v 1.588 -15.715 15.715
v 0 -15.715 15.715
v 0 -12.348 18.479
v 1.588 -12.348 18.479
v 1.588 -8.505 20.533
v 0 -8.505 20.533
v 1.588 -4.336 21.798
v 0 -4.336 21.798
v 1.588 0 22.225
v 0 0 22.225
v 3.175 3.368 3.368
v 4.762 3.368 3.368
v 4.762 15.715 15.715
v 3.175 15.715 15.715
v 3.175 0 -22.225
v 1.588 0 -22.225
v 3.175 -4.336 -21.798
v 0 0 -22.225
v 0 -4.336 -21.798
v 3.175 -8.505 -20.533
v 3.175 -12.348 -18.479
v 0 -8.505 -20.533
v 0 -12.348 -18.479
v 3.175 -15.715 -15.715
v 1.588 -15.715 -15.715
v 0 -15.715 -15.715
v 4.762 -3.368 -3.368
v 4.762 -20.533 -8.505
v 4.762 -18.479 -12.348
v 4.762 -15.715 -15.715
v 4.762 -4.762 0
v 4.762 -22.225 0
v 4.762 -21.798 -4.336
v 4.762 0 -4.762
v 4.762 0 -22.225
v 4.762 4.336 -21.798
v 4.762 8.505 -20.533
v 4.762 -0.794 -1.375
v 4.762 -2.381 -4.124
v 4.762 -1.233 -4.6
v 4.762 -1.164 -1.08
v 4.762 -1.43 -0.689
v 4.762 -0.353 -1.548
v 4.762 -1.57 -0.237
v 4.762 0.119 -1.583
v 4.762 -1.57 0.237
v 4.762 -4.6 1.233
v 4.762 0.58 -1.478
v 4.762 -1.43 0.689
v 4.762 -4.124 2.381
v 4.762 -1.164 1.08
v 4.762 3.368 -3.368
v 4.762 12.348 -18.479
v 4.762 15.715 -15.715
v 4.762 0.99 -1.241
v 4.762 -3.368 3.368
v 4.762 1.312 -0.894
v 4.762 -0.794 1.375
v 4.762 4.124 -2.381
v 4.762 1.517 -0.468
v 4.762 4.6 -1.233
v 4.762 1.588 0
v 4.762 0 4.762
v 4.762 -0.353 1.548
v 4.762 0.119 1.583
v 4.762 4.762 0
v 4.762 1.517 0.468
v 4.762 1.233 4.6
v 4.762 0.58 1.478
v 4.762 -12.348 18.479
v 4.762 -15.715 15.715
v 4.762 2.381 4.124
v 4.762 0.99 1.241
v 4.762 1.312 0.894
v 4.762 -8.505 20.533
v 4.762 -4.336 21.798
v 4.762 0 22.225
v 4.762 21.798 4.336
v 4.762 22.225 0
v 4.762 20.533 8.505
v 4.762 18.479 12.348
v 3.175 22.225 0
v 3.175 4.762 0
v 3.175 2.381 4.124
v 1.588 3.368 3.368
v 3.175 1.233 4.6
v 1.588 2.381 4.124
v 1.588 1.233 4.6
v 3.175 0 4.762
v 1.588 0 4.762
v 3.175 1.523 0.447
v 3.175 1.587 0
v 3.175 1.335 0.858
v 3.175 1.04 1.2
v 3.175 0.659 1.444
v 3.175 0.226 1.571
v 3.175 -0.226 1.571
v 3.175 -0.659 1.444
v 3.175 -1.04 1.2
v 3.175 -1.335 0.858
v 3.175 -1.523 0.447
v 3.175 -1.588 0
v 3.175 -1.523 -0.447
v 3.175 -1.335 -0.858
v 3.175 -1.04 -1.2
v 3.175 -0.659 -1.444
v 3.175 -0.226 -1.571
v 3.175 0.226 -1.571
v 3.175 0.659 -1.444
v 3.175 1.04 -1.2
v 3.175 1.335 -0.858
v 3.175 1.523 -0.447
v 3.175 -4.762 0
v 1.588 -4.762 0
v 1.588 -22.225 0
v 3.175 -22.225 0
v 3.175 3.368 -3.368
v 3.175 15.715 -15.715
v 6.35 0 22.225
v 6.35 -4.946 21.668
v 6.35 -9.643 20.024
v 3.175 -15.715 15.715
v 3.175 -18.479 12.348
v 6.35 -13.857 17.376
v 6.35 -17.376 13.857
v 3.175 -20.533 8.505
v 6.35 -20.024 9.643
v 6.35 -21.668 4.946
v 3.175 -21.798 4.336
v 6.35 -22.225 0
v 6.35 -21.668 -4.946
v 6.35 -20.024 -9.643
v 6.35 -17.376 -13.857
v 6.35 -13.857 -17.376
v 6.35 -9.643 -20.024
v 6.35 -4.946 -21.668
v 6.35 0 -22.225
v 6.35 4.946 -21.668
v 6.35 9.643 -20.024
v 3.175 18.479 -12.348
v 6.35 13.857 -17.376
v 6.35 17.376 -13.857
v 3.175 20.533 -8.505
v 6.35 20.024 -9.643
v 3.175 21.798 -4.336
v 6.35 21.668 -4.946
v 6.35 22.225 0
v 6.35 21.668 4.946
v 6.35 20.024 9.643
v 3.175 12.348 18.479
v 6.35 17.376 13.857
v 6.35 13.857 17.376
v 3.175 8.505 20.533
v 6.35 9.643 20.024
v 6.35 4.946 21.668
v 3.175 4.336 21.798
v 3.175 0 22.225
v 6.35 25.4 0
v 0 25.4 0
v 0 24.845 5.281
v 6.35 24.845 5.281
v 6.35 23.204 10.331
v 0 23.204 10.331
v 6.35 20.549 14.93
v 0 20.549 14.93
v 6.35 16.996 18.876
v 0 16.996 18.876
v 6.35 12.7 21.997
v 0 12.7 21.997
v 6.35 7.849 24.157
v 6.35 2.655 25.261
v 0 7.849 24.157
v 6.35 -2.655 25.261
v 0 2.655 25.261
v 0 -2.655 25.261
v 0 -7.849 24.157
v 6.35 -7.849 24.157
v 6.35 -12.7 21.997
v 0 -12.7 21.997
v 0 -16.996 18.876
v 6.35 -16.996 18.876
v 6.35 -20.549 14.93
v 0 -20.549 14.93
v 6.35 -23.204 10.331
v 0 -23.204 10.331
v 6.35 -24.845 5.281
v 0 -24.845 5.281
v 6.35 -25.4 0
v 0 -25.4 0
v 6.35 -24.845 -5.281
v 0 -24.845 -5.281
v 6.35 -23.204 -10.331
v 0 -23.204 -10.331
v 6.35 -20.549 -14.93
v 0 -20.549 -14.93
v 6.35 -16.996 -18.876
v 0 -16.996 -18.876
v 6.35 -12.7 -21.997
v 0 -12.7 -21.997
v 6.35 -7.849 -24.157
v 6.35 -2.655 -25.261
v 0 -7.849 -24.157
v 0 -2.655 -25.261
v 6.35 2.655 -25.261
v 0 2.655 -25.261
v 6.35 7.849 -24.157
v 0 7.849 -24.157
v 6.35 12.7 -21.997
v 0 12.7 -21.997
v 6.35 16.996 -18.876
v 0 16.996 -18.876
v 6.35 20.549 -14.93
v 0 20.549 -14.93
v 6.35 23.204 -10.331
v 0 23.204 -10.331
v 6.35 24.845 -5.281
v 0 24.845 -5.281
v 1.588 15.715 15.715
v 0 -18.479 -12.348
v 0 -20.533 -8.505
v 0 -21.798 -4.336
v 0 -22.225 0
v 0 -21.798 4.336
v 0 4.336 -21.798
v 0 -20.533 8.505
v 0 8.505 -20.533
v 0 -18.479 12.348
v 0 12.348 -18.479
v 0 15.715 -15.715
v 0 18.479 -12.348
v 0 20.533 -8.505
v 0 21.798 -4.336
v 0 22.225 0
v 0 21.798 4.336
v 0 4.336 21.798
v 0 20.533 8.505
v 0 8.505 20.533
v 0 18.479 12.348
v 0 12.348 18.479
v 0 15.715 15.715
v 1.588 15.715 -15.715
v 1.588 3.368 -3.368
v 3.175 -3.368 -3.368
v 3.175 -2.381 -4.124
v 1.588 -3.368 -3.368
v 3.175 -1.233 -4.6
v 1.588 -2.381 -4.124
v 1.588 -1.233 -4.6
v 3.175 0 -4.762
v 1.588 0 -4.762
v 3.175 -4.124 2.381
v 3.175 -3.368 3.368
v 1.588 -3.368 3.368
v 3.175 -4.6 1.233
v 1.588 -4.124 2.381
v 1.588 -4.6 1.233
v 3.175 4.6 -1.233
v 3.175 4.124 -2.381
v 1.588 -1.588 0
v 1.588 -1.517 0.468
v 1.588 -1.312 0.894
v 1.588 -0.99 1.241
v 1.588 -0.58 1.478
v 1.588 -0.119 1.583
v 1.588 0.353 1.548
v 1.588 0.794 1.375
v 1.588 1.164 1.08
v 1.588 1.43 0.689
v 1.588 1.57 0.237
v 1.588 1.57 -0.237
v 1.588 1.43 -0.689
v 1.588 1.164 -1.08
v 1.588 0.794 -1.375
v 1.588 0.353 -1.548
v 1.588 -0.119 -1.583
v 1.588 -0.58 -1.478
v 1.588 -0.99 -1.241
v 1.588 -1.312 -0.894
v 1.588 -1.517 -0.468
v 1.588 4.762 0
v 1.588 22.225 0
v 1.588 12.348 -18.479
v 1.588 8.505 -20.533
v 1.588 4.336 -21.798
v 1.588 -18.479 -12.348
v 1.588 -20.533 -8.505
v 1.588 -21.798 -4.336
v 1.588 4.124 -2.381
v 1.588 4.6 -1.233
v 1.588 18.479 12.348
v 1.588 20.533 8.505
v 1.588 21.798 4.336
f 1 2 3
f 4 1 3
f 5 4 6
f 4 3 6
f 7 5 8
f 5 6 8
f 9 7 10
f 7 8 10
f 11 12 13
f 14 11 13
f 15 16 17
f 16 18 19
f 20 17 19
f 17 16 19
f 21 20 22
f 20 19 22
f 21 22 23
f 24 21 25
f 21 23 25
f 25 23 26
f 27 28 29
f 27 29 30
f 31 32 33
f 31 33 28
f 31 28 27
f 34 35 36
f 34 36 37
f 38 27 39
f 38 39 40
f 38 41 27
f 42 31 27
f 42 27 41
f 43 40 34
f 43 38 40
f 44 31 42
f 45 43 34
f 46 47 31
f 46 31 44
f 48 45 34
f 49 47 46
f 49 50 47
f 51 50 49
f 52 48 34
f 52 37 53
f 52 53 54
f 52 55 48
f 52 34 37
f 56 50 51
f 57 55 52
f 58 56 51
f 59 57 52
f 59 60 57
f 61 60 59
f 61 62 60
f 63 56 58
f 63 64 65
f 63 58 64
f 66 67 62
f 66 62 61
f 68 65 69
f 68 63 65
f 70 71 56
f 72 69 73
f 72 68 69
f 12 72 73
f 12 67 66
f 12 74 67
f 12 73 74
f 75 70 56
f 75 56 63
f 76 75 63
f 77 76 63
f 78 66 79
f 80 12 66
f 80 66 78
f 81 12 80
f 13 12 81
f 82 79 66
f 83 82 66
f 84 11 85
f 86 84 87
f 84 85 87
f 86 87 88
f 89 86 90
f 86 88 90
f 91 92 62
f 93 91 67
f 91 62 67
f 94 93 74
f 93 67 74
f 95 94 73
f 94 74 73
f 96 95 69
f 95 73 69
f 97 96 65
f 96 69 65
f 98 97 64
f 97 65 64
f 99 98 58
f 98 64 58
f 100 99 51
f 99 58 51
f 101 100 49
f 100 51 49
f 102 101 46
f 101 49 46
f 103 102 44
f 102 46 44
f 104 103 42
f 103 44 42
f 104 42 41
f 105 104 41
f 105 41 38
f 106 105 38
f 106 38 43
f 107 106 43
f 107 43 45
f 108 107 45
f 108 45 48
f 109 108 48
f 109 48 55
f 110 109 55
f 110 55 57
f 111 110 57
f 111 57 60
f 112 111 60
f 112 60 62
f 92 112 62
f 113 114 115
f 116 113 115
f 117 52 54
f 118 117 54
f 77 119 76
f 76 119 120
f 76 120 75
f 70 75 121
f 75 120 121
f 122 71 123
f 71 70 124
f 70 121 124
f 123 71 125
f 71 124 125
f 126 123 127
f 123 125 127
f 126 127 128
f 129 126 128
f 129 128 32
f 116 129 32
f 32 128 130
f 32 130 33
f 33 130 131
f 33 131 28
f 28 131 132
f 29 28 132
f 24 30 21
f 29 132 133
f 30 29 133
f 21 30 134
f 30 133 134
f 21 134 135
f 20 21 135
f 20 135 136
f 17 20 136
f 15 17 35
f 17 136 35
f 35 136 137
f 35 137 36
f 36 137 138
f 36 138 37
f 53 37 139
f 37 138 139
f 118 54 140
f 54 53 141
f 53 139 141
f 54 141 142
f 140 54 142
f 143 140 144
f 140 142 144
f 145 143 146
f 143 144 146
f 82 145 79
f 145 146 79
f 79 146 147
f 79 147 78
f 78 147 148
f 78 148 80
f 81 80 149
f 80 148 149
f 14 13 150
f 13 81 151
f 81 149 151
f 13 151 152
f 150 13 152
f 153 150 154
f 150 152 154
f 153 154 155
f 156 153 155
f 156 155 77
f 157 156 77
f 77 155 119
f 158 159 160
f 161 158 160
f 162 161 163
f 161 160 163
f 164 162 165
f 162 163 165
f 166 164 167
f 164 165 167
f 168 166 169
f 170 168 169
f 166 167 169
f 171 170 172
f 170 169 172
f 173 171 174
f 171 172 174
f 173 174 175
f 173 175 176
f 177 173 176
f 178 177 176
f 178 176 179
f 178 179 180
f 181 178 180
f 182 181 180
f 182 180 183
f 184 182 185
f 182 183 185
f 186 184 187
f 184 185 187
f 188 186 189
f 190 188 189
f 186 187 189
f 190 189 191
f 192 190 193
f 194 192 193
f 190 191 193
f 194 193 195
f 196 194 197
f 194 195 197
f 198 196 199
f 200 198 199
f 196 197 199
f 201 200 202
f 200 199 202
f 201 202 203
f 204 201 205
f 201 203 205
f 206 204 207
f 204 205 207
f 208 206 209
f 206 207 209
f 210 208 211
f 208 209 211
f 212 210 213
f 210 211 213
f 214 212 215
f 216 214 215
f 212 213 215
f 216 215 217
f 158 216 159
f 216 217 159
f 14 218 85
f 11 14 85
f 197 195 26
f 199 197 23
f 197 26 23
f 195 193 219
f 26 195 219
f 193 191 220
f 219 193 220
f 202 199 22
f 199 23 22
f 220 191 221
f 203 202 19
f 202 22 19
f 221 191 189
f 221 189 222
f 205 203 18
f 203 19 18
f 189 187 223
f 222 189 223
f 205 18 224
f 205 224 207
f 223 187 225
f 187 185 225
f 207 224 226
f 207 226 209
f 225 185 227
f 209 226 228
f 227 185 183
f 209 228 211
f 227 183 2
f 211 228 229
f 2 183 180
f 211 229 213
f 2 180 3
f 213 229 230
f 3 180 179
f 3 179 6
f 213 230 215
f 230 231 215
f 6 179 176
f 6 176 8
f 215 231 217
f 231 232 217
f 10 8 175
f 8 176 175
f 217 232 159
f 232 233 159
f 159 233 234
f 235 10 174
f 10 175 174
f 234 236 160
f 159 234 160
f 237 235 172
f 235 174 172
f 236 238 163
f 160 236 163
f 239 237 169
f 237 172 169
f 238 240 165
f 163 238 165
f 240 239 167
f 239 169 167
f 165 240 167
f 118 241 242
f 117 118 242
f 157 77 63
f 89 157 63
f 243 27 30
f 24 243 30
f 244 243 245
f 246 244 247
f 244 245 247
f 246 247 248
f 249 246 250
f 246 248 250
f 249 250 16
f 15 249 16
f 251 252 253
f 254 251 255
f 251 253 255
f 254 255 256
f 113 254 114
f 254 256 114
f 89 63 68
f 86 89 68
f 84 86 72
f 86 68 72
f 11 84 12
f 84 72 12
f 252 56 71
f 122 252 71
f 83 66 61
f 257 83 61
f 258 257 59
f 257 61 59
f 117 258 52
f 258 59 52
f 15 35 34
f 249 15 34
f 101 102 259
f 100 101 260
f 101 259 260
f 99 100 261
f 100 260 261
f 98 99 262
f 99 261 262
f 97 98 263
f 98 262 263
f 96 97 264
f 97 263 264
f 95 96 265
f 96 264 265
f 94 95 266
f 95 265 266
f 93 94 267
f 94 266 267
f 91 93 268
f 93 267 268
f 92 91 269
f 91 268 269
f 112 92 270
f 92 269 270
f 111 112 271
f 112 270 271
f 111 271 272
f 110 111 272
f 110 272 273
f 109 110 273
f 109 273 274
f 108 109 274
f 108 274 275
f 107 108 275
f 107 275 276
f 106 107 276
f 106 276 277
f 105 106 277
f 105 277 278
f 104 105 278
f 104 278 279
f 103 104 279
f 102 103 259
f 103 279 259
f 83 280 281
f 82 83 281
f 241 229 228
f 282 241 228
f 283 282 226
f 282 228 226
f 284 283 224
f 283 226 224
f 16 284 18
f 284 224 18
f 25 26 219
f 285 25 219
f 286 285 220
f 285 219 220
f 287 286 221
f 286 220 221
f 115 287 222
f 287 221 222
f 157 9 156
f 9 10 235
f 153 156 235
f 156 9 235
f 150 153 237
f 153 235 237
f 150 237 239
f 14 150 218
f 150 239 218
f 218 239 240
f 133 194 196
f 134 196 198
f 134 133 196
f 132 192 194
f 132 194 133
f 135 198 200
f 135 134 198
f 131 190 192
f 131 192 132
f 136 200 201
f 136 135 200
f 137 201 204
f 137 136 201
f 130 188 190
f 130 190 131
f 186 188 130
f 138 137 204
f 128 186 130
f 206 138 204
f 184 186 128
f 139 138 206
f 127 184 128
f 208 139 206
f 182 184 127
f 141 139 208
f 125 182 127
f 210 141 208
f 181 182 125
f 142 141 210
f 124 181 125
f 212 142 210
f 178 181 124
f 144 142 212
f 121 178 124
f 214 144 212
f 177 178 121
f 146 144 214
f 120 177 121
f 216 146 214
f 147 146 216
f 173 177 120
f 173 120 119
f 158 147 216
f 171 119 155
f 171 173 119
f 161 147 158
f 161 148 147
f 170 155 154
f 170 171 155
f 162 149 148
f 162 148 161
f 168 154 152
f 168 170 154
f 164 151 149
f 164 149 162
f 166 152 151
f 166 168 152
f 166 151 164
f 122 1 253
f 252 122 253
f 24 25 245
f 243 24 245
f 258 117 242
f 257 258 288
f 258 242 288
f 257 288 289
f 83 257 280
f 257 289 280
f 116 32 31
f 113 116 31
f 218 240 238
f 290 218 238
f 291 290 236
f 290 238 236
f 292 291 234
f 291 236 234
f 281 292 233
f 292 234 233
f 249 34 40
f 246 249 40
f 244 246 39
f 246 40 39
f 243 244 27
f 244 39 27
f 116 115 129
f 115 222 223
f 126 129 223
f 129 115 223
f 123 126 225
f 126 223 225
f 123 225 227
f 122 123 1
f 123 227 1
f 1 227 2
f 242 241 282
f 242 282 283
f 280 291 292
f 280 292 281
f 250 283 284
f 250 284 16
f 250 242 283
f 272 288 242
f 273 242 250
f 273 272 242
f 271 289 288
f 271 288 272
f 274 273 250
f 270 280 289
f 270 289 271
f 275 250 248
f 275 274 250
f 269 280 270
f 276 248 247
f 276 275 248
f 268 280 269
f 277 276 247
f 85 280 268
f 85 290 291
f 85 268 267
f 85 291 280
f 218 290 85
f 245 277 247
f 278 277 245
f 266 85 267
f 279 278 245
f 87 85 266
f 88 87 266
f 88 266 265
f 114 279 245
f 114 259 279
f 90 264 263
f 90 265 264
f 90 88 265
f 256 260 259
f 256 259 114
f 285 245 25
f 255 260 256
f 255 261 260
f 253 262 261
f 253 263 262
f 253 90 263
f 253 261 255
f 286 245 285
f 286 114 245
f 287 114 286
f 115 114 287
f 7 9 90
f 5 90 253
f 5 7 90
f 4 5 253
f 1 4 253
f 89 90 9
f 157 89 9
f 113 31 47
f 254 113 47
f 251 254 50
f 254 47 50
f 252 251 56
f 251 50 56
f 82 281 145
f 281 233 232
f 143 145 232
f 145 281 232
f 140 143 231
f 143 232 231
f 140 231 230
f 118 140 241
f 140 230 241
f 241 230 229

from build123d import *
from build123d import SkipClean  # not in build123d's __all__

# Parameters (mm, degrees)
F0_R       = 25.4
F1_DEPTH   = 6.35
F2_R       = 1.5875
F3_DEPTH   = 3.175
F4_DEPTH   = 1.5875
F5_R       = 1.5875
F3_FACE4_R = 1.5875
F4_FACE_R  = 1.5875
F6_DEPTH   = 1.5875
F7_DEPTH   = 3.175


with BuildPart() as f1:
    # F0 (on Right) → F1 (new body)
    with BuildSketch(Plane.YZ):
        Circle(F0_R)
    extrude(amount=F1_DEPTH)

    # F2 (on face) → F3 (cut)
    with BuildSketch(Plane.YZ.offset(6.35)):
        with BuildLine():
            Line((-3.3675960454, 3.3675960454), (-15.7154482119, 15.7154482119))
            ThreePointArc((-15.7154482119, 15.7154482119), (-20.5332226101, 8.5051392843), (-22.225, 0))
            Line((-22.225, 0), (-4.7625, 0))
            ThreePointArc((-4.7625, 0), (-4.3999762736, 1.8225298466), (-3.3675960454, 3.3675960454))
        make_face()
        with BuildLine():
            ThreePointArc((-15.7154482119, -15.7154482119), (-8.5051392843, -20.5332226101), (0, -22.225))
            Line((0, -22.225), (0, -4.7625))
            ThreePointArc((0, -4.7625), (-1.8225298466, -4.3999762736), (-3.3675960454, -3.3675960454))
            Line((-3.3675960454, -3.3675960454), (-15.7154482119, -15.7154482119))
        make_face()
        with BuildLine():
            ThreePointArc((15.7154482119, -15.7154482119), (20.5332226101, -8.5051392843), (22.225, 0))
            Line((22.225, 0), (4.7625, 0))
            ThreePointArc((4.7625, 0), (4.3999762736, -1.8225298466), (3.3675960454, -3.3675960454))
            Line((3.3675960454, -3.3675960454), (15.7154482119, -15.7154482119))
        make_face()
        with BuildLine():
            Line((3.3675960454, 3.3675960454), (15.7154482119, 15.7154482119))
            ThreePointArc((15.7154482119, 15.7154482119), (8.5051392843, 20.5332226101), (0, 22.225))
            Line((0, 22.225), (0, 4.7625))
            ThreePointArc((0, 4.7625), (1.8225298466, 4.3999762736), (3.3675960454, 3.3675960454))
        make_face()
        Circle(F2_R)
    extrude(amount=-F3_DEPTH, mode=Mode.SUBTRACT)

    # F2 (on face) → F4 (cut)
    with BuildSketch(Plane.YZ.offset(6.35)):
        with BuildLine():
            Line((0, 4.7625), (0, 22.225))
            ThreePointArc((0, 22.225), (-8.5051392843, 20.5332226101), (-15.7154482119, 15.7154482119))
            Line((-15.7154482119, 15.7154482119), (-3.3675960454, 3.3675960454))
            ThreePointArc((-3.3675960454, 3.3675960454), (-1.8225298466, 4.3999762736), (0, 4.7625))
        make_face()
        with BuildLine():
            Line((4.7625, 0), (22.225, 0))
            ThreePointArc((22.225, 0), (20.5332226101, 8.5051392843), (15.7154482119, 15.7154482119))
            Line((15.7154482119, 15.7154482119), (3.3675960454, 3.3675960454))
            ThreePointArc((3.3675960454, 3.3675960454), (4.3999762736, 1.8225298466), (4.7625, 0))
        make_face()
        with BuildLine():
            ThreePointArc((0, -22.225), (8.5051392843, -20.5332226101), (15.7154482119, -15.7154482119))
            Line((15.7154482119, -15.7154482119), (3.3675960454, -3.3675960454))
            ThreePointArc((3.3675960454, -3.3675960454), (1.8225298466, -4.3999762736), (0, -4.7625))
            Line((0, -4.7625), (0, -22.225))
        make_face()
        with BuildLine():
            ThreePointArc((-22.225, 0), (-20.5332226101, -8.5051392843), (-15.7154482119, -15.7154482119))
            Line((-15.7154482119, -15.7154482119), (-3.3675960454, -3.3675960454))
            ThreePointArc((-3.3675960454, -3.3675960454), (-4.3999762736, -1.8225298466), (-4.7625, 0))
            Line((-4.7625, 0), (-22.225, 0))
        make_face()
        with BuildLine():
            ThreePointArc((3.3675960454, -3.3675960454), (4.3999762736, -1.8225298466), (4.7625, 0))
            ThreePointArc((4.7625, 0), (4.3999762736, 1.8225298466), (3.3675960454, 3.3675960454))
            ThreePointArc((3.3675960454, 3.3675960454), (1.8225298466, 4.3999762736), (0, 4.7625))
            ThreePointArc((0, 4.7625), (-1.8225298466, 4.3999762736), (-3.3675960454, 3.3675960454))
            ThreePointArc((-3.3675960454, 3.3675960454), (-4.3999762736, 1.8225298466), (-4.7625, 0))
            ThreePointArc((-4.7625, 0), (-4.3999762736, -1.8225298466), (-3.3675960454, -3.3675960454))
            ThreePointArc((-3.3675960454, -3.3675960454), (-1.8225298466, -4.3999762736), (0, -4.7625))
            ThreePointArc((0, -4.7625), (1.8225298466, -4.3999762736), (3.3675960454, -3.3675960454))
        make_face()
        Circle(F2_R, mode=Mode.SUBTRACT)
    extrude(amount=-F4_DEPTH, mode=Mode.SUBTRACT)

    # F5 (on face) + F3_face (on face) + F3_face1 (on face) + F3_face2 (on face) + F3_face3 (on face) + F3_face4 (on face) + F4_face (on face) → F6 (cut)
    with BuildSketch(Plane(origin=(0, 0, 0), x_dir=(0, -1, 0), z_dir=(-1, 0, 0))):
        with BuildLine():
            Line((3.3675960454, 3.3675960454), (15.7154482119, 15.7154482119))
            ThreePointArc((15.7154482119, 15.7154482119), (8.5051392843, 20.5332226101), (0, 22.225))
            Line((0, 22.225), (0, 4.7625))
            ThreePointArc((0, 4.7625), (1.8225298466, 4.3999762736), (3.3675960454, 3.3675960454))
        make_face()
        with BuildLine():
            ThreePointArc((15.7154482119, -15.7154482119), (20.5332226101, -8.5051392843), (22.225, 0))
            Line((22.225, 0), (4.7625, 0))
            ThreePointArc((4.7625, 0), (4.3999762736, -1.8225298466), (3.3675960454, -3.3675960454))
            Line((3.3675960454, -3.3675960454), (15.7154482119, -15.7154482119))
        make_face()
        with BuildLine():
            ThreePointArc((-15.7154482119, -15.7154482119), (-8.5051392843, -20.5332226101), (0, -22.225))
            Line((0, -22.225), (0, -4.7625))
            ThreePointArc((0, -4.7625), (-1.8225298466, -4.3999762736), (-3.3675960454, -3.3675960454))
            Line((-3.3675960454, -3.3675960454), (-15.7154482119, -15.7154482119))
        make_face()
        with BuildLine():
            Line((-3.3675960454, 3.3675960454), (-15.7154482119, 15.7154482119))
            ThreePointArc((-15.7154482119, 15.7154482119), (-20.5332226101, 8.5051392843), (-22.225, 0))
            Line((-22.225, 0), (-4.7625, 0))
            ThreePointArc((-4.7625, 0), (-4.3999762736, 1.8225298466), (-3.3675960454, 3.3675960454))
        make_face()
        with BuildLine():
            ThreePointArc((3.3675960454, -3.3675960454), (4.3999762736, -1.8225298466), (4.7625, 0))
            ThreePointArc((4.7625, 0), (4.3999762736, 1.8225298466), (3.3675960454, 3.3675960454))
            ThreePointArc((3.3675960454, 3.3675960454), (1.8225298466, 4.3999762736), (0, 4.7625))
            ThreePointArc((0, 4.7625), (-1.8225298466, 4.3999762736), (-3.3675960454, 3.3675960454))
            ThreePointArc((-3.3675960454, 3.3675960454), (-4.3999762736, 1.8225298466), (-4.7625, 0))
            ThreePointArc((-4.7625, 0), (-4.3999762736, -1.8225298466), (-3.3675960454, -3.3675960454))
            ThreePointArc((-3.3675960454, -3.3675960454), (-1.8225298466, -4.3999762736), (0, -4.7625))
            ThreePointArc((0, -4.7625), (1.8225298466, -4.3999762736), (3.3675960454, -3.3675960454))
        make_face()
        Circle(F5_R, mode=Mode.SUBTRACT)
    with BuildSketch(Plane(origin=(3.175, -13.844128687, 5.7344258614), x_dir=(0, 1, 0), z_dir=(1, 0, 0))):
        with BuildLine():
            ThreePointArc((-1.8713195248, 9.9810223505), (-6.689093923, 2.7707134229), (-8.380871313, -5.7344258614))
            Line((-8.380871313, -5.7344258614), (9.081628687, -5.7344258614))
            ThreePointArc((9.081628687, -5.7344258614), (9.4441524134, -3.9118960148), (10.4765326416, -2.366829816))
            Line((10.4765326416, -2.366829816), (-1.8713195248, 9.9810223505))
        make_face()
    with BuildSketch(Plane(origin=(3.175, -5.7344258614, -13.844128687), x_dir=(0, 1, 0), z_dir=(1, 0, 0))):
        with BuildLine():
            ThreePointArc((-9.9810223505, -1.8713195248), (-2.7707134229, -6.689093923), (5.7344258614, -8.380871313))
            Line((5.7344258614, -8.380871313), (5.7344258614, 9.081628687))
            ThreePointArc((5.7344258614, 9.081628687), (3.9118960148, 9.4441524134), (2.366829816, 10.4765326416))
            Line((2.366829816, 10.4765326416), (-9.9810223505, -1.8713195248))
        make_face()
    with BuildSketch(Plane(origin=(3.175, 13.844128687, -5.7344258614), x_dir=(0, 1, 0), z_dir=(1, 0, 0))):
        with BuildLine():
            Line((-10.4765326416, 2.366829816), (1.8713195248, -9.9810223505))
            ThreePointArc((1.8713195248, -9.9810223505), (6.689093923, -2.7707134229), (8.380871313, 5.7344258614))
            Line((8.380871313, 5.7344258614), (-9.081628687, 5.7344258614))
            ThreePointArc((-9.081628687, 5.7344258614), (-9.4441524134, 3.9118960148), (-10.4765326416, 2.366829816))
        make_face()
    with BuildSketch(Plane(origin=(3.175, 5.7344258614, 13.844128687), x_dir=(0, 1, 0), z_dir=(1, 0, 0))):
        with BuildLine():
            ThreePointArc((9.9810223505, 1.8713195248), (2.7707134229, 6.689093923), (-5.7344258614, 8.380871313))
            Line((-5.7344258614, 8.380871313), (-5.7344258614, -9.081628687))
            ThreePointArc((-5.7344258614, -9.081628687), (-3.9118960148, -9.4441524134), (-2.366829816, -10.4765326416))
            Line((-2.366829816, -10.4765326416), (9.9810223505, 1.8713195248))
        make_face()
    with BuildSketch(Plane.YZ.offset(3.175)):
        Circle(F3_FACE4_R)
    with BuildSketch(Plane.YZ.offset(4.7625)):
        with BuildLine():
            Line((-15.7154482119, 15.7154482119), (-3.3675960454, 3.3675960454))
            ThreePointArc((-3.3675960454, 3.3675960454), (-4.3999762736, 1.8225298466), (-4.7625, 0))
            Line((-4.7625, 0), (-22.225, 0))
            ThreePointArc((-22.225, 0), (-20.5332226101, -8.5051392843), (-15.7154482119, -15.7154482119))
            Line((-15.7154482119, -15.7154482119), (-3.3675960454, -3.3675960454))
            ThreePointArc((-3.3675960454, -3.3675960454), (-1.8225298466, -4.3999762736), (0, -4.7625))
            Line((0, -4.7625), (0, -22.225))
            ThreePointArc((0, -22.225), (8.5051392843, -20.5332226101), (15.7154482119, -15.7154482119))
            Line((15.7154482119, -15.7154482119), (3.3675960454, -3.3675960454))
            ThreePointArc((3.3675960454, -3.3675960454), (4.3999762736, -1.8225298466), (4.7625, 0))
            Line((4.7625, 0), (22.225, 0))
            ThreePointArc((22.225, 0), (20.5332226101, 8.5051392843), (15.7154482119, 15.7154482119))
            Line((15.7154482119, 15.7154482119), (3.3675960454, 3.3675960454))
            ThreePointArc((3.3675960454, 3.3675960454), (1.8225298466, 4.3999762736), (0, 4.7625))
            Line((0, 4.7625), (0, 22.225))
            ThreePointArc((0, 22.225), (-8.5051392843, 20.5332226101), (-15.7154482119, 15.7154482119))
        make_face()
        Circle(F4_FACE_R, mode=Mode.SUBTRACT)
    extrude(amount=-F6_DEPTH, dir=(-1, 0, 0), mode=Mode.SUBTRACT)

    # F5 (on face) → F7 (cut)
    with BuildSketch(Plane(origin=(0, 0, 0), x_dir=(0, -1, 0), z_dir=(-1, 0, 0))):
        with BuildLine():
            Line((0, 4.7625), (0, 22.225))
            ThreePointArc((0, 22.225), (-8.5051392843, 20.5332226101), (-15.7154482119, 15.7154482119))
            Line((-15.7154482119, 15.7154482119), (-3.3675960454, 3.3675960454))
            ThreePointArc((-3.3675960454, 3.3675960454), (-1.8225298466, 4.3999762736), (0, 4.7625))
        make_face()
        with BuildLine():
            ThreePointArc((-22.225, 0), (-20.5332226101, -8.5051392843), (-15.7154482119, -15.7154482119))
            Line((-15.7154482119, -15.7154482119), (-3.3675960454, -3.3675960454))
            ThreePointArc((-3.3675960454, -3.3675960454), (-4.3999762736, -1.8225298466), (-4.7625, 0))
            Line((-4.7625, 0), (-22.225, 0))
        make_face()
        with BuildLine():
            ThreePointArc((0, -22.225), (8.5051392843, -20.5332226101), (15.7154482119, -15.7154482119))
            Line((15.7154482119, -15.7154482119), (3.3675960454, -3.3675960454))
            ThreePointArc((3.3675960454, -3.3675960454), (1.8225298466, -4.3999762736), (0, -4.7625))
            Line((0, -4.7625), (0, -22.225))
        make_face()
        with BuildLine():
            Line((4.7625, 0), (22.225, 0))
            ThreePointArc((22.225, 0), (20.5332226101, 8.5051392843), (15.7154482119, 15.7154482119))
            Line((15.7154482119, 15.7154482119), (3.3675960454, 3.3675960454))
            ThreePointArc((3.3675960454, 3.3675960454), (4.3999762736, 1.8225298466), (4.7625, 0))
        make_face()
        Circle(F5_R)
    with SkipClean():  # cleaning this boolean's faces spoils the solid; the shape is the same uncleaned
        extrude(amount=-F7_DEPTH, mode=Mode.SUBTRACT)


solid = f1.part
